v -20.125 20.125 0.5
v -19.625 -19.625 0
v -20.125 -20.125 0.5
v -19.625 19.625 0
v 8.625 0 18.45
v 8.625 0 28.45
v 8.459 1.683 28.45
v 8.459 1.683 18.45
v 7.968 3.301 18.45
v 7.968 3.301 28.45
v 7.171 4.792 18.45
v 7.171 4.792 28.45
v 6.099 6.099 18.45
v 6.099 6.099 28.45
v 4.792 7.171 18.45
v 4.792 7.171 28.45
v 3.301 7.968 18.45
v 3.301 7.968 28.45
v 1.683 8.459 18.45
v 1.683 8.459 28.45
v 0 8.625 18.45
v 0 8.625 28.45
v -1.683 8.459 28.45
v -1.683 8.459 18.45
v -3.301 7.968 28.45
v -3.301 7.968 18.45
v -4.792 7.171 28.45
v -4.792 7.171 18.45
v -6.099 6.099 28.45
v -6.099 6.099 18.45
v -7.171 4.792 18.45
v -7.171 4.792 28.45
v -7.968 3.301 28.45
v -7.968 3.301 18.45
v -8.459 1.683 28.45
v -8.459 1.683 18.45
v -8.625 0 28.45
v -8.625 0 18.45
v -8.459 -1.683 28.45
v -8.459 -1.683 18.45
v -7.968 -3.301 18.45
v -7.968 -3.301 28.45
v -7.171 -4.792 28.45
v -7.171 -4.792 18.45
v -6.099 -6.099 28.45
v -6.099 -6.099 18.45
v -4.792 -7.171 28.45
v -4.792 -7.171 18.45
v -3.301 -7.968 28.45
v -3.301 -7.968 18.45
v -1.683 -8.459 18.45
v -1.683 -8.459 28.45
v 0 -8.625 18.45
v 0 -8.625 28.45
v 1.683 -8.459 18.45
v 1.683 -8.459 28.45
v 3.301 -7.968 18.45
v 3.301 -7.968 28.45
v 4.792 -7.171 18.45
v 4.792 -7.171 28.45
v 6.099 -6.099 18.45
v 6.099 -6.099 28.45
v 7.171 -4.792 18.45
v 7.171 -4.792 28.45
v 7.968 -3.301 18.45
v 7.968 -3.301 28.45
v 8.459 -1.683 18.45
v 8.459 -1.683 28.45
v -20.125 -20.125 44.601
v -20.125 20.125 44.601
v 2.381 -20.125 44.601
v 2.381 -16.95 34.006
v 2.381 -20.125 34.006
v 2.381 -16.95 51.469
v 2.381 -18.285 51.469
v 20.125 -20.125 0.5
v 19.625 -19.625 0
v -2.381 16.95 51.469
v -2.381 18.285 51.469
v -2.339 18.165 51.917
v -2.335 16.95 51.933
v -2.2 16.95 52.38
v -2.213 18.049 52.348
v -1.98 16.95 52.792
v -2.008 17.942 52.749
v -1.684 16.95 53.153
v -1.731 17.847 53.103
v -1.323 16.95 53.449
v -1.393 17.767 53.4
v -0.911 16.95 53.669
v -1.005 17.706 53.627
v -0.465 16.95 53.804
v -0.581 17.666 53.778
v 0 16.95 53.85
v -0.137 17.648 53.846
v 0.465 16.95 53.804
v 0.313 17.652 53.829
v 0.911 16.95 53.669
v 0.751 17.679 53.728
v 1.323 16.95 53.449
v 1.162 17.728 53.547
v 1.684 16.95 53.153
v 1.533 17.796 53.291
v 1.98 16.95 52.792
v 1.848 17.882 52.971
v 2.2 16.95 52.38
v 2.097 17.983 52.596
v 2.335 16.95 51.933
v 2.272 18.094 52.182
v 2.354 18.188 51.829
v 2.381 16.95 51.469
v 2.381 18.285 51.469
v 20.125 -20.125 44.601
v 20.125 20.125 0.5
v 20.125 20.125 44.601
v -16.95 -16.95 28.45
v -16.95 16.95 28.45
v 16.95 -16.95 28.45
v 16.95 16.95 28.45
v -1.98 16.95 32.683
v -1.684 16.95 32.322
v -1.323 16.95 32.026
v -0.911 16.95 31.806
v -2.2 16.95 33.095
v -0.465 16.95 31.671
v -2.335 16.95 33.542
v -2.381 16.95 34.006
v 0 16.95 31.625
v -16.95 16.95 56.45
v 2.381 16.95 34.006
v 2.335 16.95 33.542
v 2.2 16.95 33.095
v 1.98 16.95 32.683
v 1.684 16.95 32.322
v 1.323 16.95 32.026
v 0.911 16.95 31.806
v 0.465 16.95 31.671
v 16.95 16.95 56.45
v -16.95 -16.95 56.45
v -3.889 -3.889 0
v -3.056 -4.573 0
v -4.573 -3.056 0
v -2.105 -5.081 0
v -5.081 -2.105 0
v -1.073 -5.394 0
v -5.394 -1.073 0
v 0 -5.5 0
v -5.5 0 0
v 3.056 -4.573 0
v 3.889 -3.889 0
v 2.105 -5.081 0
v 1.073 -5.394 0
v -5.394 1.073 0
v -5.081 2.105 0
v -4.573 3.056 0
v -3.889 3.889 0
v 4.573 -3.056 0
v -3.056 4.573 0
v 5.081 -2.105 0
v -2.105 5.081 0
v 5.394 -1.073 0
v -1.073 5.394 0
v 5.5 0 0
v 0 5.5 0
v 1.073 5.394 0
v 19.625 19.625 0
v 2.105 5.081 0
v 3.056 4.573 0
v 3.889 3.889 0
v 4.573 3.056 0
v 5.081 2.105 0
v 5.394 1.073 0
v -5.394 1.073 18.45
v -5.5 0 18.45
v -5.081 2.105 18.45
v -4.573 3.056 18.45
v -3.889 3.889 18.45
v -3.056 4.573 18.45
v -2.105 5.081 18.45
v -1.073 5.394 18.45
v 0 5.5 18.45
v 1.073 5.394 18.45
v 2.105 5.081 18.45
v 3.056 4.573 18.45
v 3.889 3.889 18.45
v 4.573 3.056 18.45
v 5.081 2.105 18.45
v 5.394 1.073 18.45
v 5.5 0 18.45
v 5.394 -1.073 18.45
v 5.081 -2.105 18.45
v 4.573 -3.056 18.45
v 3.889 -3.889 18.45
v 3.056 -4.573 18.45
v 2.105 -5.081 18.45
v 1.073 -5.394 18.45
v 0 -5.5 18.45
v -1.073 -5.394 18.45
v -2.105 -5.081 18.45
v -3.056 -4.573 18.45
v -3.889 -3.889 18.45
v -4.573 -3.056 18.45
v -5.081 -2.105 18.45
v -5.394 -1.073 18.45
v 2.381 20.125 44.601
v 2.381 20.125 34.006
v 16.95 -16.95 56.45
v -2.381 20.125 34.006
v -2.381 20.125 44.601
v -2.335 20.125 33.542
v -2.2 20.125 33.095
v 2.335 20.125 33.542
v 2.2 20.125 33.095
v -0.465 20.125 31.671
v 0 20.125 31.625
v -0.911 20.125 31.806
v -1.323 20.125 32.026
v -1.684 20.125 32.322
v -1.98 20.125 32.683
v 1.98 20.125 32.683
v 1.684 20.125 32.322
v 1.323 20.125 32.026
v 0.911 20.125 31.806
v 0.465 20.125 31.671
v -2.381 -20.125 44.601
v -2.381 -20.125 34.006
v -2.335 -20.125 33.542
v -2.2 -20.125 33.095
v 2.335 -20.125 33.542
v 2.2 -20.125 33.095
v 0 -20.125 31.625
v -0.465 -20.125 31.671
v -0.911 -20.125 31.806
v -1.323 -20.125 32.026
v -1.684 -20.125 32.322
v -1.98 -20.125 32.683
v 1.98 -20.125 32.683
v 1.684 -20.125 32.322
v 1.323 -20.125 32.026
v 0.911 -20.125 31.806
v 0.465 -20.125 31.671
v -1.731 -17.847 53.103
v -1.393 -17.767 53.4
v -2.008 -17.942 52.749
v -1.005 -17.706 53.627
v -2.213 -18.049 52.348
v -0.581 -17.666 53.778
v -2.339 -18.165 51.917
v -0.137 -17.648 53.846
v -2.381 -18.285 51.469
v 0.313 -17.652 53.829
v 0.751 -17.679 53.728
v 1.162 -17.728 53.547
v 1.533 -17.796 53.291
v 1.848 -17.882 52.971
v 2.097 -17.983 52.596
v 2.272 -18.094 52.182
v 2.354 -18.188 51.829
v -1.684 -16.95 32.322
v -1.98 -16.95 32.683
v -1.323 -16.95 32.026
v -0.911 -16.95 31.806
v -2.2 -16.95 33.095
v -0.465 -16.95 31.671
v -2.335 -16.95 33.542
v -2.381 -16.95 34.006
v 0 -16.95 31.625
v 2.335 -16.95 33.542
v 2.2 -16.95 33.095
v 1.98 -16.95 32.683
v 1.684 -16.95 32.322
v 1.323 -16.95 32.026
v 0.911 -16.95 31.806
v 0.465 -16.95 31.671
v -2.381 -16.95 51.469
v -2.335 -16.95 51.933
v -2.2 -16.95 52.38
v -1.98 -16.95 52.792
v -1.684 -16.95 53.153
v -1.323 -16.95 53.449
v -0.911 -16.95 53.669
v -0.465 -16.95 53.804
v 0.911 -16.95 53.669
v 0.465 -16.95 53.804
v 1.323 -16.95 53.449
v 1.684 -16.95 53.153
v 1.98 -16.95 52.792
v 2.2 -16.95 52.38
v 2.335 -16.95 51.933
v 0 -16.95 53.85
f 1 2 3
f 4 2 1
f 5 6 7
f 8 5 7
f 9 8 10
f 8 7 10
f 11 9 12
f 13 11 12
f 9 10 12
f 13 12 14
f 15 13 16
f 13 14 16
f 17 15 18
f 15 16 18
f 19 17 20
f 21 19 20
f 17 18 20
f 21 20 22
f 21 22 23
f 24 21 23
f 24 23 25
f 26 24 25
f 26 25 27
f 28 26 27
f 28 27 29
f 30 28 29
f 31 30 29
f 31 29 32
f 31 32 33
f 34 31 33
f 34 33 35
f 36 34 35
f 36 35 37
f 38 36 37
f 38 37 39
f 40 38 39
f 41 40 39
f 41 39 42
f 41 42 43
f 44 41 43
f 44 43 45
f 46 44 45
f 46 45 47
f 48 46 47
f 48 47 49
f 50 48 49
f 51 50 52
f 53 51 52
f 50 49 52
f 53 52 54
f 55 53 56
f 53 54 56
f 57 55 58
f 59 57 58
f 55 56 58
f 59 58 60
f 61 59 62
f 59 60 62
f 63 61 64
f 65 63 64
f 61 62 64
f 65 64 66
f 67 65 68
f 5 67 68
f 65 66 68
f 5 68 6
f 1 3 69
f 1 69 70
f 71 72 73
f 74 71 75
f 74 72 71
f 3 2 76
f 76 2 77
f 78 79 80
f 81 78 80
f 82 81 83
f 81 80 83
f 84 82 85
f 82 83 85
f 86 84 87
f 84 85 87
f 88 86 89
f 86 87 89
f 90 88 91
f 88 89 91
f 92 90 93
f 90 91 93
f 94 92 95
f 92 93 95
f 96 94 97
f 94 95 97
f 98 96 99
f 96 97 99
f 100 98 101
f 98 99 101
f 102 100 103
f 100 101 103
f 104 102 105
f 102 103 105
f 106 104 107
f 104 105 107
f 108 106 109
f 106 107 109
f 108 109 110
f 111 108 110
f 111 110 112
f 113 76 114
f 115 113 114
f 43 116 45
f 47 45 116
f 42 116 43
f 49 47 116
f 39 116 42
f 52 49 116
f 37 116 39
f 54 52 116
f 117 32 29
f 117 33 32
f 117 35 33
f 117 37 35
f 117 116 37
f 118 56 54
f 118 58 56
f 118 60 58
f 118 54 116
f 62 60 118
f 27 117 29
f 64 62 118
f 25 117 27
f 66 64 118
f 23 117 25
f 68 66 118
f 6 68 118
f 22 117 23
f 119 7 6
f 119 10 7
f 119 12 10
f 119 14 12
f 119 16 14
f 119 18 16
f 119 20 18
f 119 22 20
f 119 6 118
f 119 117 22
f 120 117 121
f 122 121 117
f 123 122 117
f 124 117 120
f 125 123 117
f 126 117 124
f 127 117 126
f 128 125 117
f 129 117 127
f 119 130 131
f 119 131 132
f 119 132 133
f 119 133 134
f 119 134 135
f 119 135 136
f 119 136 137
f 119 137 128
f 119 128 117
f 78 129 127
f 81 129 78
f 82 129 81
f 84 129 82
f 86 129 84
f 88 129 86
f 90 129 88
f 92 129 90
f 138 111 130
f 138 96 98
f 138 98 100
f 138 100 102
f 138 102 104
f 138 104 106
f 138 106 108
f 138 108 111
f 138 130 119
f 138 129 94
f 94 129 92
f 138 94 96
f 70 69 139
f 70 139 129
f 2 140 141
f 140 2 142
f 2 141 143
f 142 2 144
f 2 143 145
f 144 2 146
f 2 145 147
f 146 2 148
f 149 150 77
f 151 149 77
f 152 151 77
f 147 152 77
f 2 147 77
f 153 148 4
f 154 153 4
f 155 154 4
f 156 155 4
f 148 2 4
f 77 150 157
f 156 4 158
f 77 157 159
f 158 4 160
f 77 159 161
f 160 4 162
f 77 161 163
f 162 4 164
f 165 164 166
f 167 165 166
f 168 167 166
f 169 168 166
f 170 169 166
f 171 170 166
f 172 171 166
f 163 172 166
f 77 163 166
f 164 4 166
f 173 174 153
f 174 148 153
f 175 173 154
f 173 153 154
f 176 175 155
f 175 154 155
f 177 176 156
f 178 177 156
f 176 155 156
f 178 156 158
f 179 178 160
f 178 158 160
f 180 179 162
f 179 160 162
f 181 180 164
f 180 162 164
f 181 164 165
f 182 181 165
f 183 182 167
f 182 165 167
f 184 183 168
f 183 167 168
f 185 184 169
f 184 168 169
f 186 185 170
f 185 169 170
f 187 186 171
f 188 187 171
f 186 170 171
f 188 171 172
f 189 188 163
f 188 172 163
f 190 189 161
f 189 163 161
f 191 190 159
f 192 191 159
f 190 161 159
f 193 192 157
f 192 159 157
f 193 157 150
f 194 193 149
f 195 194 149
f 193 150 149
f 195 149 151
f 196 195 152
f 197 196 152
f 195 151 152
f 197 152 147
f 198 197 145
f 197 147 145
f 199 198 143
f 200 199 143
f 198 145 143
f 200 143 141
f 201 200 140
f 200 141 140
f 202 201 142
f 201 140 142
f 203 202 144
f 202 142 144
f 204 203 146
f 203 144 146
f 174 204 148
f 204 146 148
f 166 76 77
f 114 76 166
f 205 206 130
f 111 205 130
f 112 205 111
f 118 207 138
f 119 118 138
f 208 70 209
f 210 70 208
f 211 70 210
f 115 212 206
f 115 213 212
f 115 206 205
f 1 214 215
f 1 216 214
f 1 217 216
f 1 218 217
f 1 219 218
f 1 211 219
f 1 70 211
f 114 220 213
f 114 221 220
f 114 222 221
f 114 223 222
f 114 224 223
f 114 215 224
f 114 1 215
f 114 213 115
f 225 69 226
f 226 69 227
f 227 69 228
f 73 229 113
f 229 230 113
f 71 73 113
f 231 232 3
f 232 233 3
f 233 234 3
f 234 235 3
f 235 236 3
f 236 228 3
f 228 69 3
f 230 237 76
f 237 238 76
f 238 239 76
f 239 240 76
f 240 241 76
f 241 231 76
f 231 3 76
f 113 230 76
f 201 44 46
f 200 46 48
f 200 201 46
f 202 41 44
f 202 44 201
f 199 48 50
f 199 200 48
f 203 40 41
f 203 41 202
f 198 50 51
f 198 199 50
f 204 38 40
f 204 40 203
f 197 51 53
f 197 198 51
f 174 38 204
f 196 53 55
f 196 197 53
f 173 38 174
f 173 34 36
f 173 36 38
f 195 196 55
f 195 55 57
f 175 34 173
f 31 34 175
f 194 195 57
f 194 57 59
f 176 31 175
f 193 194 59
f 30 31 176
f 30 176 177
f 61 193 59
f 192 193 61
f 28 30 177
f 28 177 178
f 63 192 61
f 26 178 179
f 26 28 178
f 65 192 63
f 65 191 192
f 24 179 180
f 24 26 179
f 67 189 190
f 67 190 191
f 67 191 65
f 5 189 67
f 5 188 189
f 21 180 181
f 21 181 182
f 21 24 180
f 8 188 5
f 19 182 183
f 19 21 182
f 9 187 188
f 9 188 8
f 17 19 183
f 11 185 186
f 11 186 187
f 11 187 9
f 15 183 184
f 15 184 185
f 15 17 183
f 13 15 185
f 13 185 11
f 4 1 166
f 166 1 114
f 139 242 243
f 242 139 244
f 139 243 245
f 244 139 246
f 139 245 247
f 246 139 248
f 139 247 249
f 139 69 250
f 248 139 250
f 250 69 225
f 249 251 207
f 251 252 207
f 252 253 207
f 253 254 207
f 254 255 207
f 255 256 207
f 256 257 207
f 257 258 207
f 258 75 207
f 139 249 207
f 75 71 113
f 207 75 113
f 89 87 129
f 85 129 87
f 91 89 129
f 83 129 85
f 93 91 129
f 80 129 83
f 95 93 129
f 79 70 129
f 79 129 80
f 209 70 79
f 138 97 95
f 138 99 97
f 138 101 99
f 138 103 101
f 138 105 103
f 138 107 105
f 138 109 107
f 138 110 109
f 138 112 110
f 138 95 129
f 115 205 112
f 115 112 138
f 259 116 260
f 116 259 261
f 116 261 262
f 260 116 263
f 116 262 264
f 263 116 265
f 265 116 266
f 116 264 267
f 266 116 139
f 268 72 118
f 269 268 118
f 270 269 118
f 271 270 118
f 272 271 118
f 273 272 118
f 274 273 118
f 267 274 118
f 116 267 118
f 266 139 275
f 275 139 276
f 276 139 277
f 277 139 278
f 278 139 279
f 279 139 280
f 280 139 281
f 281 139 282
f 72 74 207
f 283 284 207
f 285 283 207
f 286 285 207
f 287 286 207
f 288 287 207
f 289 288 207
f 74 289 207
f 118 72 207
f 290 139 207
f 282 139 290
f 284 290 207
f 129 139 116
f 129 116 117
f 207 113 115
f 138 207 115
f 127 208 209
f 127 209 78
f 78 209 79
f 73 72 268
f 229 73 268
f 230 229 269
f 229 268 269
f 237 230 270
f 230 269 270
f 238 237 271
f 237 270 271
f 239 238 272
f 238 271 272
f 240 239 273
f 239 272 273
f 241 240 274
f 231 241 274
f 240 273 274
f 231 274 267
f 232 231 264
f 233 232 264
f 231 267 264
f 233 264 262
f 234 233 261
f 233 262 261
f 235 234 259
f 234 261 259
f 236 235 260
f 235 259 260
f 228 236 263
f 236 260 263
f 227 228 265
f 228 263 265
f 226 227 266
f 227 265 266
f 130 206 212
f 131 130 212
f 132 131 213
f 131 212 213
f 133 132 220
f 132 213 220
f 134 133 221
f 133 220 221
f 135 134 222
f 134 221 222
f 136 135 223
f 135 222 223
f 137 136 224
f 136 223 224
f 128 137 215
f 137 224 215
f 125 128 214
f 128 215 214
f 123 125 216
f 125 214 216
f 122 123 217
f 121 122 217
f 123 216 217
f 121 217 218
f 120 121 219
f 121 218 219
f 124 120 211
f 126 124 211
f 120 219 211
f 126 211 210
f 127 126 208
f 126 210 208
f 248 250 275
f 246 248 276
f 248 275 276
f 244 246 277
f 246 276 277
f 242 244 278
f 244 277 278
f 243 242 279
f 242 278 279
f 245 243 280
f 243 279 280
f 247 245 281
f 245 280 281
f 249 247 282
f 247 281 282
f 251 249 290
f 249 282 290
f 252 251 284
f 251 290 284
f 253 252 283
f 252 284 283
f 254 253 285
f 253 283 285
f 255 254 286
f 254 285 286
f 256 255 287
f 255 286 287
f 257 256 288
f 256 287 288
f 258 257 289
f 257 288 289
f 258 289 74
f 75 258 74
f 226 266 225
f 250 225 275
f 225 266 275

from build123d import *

# Parameters (mm, degrees)
F0_W           = 40.25
F0_H           = 40.25
F1_DEPTH       = 56.45
F2_W           = 33.9
F2_H           = 33.9
F3_DEPTH       = 28
F5_D           = 11
F5_CBORE_D     = 17.25
F5_CBORE_DEPTH = 10
F6_SIZE2       = 11.849251
F6_SIZE        = 3.17499
F8_W           = 4.7625
F8_H           = 17.4625
F9_DEPTH       = 40.251
F10_SIZE       = 0.5


# Not quite as in the source:
# - a fillet or chamfer is up to 0.001 mm smaller than in the source, because OpenCascade refuses the exact size


with BuildPart() as f1:
    # F0 (on Top) → F1 (new body)
    with BuildSketch(Plane.XY):
        Rectangle(F0_W, F0_H)
    extrude(amount=F1_DEPTH)

    # F2 (on face) → F3 (cut)
    with BuildSketch(Plane.XY.offset(56.45)):
        Rectangle(F2_W, F2_H)
    extrude(amount=-F3_DEPTH, mode=Mode.SUBTRACT)

    # F5 (through all)
    with Locations(Plane.XY.offset(28.45)):
        with Locations((0, 0)):
            CounterBoreHole(F5_D / 2, F5_CBORE_D / 2, F5_CBORE_DEPTH)

    # F6 (size 3.175 and 11.849261314 in the source; OpenCascade refuses exactly that, so slightly less here)
    f6_edges = [f1.edges().sort_by_distance(p)[0] for p in [
        (0, 20.125, 56.45),
        (20.125, 0, 56.45),
        (0, -20.125, 56.45),
        (-20.125, 0, 56.45),
    ]]
    f6_side = f1.faces().sort_by_distance((0, -19.555779, 56.45))[0]
    chamfer(f6_edges, length=F6_SIZE, length2=F6_SIZE2, reference=f6_side)

    # F8 (on offset) → F9 (cut, through all)
    with BuildSketch(Plane(origin=(0, 20.125, 0), x_dir=(-1, 0, 0), z_dir=(0, 1, 0))):
        with BuildLine():
            ThreePointArc((-2.38125, 34.00625), (0, 31.625), (2.38125, 34.00625))
            Line((2.38125, 34.00625), (-2.38125, 34.00625))
        make_face()
        with Locations((0, 42.7375)):
            Rectangle(F8_W, F8_H)
        with BuildLine():
            Line((-2.38125, 51.46875), (2.38125, 51.46875))
            ThreePointArc((2.38125, 51.46875), (0, 53.85), (-2.38125, 51.46875))
        make_face()
    extrude(amount=-F9_DEPTH, mode=Mode.SUBTRACT)

    # F10
    f10_edges = [f1.edges().sort_by_distance(p)[0] for p in [
        (20.125, 0, 0),
        (0, -20.125, 0),
        (-20.125, 0, 0),
        (0, 20.125, 0),
    ]]
    chamfer(f10_edges, length=F10_SIZE)


solid = f1.part
